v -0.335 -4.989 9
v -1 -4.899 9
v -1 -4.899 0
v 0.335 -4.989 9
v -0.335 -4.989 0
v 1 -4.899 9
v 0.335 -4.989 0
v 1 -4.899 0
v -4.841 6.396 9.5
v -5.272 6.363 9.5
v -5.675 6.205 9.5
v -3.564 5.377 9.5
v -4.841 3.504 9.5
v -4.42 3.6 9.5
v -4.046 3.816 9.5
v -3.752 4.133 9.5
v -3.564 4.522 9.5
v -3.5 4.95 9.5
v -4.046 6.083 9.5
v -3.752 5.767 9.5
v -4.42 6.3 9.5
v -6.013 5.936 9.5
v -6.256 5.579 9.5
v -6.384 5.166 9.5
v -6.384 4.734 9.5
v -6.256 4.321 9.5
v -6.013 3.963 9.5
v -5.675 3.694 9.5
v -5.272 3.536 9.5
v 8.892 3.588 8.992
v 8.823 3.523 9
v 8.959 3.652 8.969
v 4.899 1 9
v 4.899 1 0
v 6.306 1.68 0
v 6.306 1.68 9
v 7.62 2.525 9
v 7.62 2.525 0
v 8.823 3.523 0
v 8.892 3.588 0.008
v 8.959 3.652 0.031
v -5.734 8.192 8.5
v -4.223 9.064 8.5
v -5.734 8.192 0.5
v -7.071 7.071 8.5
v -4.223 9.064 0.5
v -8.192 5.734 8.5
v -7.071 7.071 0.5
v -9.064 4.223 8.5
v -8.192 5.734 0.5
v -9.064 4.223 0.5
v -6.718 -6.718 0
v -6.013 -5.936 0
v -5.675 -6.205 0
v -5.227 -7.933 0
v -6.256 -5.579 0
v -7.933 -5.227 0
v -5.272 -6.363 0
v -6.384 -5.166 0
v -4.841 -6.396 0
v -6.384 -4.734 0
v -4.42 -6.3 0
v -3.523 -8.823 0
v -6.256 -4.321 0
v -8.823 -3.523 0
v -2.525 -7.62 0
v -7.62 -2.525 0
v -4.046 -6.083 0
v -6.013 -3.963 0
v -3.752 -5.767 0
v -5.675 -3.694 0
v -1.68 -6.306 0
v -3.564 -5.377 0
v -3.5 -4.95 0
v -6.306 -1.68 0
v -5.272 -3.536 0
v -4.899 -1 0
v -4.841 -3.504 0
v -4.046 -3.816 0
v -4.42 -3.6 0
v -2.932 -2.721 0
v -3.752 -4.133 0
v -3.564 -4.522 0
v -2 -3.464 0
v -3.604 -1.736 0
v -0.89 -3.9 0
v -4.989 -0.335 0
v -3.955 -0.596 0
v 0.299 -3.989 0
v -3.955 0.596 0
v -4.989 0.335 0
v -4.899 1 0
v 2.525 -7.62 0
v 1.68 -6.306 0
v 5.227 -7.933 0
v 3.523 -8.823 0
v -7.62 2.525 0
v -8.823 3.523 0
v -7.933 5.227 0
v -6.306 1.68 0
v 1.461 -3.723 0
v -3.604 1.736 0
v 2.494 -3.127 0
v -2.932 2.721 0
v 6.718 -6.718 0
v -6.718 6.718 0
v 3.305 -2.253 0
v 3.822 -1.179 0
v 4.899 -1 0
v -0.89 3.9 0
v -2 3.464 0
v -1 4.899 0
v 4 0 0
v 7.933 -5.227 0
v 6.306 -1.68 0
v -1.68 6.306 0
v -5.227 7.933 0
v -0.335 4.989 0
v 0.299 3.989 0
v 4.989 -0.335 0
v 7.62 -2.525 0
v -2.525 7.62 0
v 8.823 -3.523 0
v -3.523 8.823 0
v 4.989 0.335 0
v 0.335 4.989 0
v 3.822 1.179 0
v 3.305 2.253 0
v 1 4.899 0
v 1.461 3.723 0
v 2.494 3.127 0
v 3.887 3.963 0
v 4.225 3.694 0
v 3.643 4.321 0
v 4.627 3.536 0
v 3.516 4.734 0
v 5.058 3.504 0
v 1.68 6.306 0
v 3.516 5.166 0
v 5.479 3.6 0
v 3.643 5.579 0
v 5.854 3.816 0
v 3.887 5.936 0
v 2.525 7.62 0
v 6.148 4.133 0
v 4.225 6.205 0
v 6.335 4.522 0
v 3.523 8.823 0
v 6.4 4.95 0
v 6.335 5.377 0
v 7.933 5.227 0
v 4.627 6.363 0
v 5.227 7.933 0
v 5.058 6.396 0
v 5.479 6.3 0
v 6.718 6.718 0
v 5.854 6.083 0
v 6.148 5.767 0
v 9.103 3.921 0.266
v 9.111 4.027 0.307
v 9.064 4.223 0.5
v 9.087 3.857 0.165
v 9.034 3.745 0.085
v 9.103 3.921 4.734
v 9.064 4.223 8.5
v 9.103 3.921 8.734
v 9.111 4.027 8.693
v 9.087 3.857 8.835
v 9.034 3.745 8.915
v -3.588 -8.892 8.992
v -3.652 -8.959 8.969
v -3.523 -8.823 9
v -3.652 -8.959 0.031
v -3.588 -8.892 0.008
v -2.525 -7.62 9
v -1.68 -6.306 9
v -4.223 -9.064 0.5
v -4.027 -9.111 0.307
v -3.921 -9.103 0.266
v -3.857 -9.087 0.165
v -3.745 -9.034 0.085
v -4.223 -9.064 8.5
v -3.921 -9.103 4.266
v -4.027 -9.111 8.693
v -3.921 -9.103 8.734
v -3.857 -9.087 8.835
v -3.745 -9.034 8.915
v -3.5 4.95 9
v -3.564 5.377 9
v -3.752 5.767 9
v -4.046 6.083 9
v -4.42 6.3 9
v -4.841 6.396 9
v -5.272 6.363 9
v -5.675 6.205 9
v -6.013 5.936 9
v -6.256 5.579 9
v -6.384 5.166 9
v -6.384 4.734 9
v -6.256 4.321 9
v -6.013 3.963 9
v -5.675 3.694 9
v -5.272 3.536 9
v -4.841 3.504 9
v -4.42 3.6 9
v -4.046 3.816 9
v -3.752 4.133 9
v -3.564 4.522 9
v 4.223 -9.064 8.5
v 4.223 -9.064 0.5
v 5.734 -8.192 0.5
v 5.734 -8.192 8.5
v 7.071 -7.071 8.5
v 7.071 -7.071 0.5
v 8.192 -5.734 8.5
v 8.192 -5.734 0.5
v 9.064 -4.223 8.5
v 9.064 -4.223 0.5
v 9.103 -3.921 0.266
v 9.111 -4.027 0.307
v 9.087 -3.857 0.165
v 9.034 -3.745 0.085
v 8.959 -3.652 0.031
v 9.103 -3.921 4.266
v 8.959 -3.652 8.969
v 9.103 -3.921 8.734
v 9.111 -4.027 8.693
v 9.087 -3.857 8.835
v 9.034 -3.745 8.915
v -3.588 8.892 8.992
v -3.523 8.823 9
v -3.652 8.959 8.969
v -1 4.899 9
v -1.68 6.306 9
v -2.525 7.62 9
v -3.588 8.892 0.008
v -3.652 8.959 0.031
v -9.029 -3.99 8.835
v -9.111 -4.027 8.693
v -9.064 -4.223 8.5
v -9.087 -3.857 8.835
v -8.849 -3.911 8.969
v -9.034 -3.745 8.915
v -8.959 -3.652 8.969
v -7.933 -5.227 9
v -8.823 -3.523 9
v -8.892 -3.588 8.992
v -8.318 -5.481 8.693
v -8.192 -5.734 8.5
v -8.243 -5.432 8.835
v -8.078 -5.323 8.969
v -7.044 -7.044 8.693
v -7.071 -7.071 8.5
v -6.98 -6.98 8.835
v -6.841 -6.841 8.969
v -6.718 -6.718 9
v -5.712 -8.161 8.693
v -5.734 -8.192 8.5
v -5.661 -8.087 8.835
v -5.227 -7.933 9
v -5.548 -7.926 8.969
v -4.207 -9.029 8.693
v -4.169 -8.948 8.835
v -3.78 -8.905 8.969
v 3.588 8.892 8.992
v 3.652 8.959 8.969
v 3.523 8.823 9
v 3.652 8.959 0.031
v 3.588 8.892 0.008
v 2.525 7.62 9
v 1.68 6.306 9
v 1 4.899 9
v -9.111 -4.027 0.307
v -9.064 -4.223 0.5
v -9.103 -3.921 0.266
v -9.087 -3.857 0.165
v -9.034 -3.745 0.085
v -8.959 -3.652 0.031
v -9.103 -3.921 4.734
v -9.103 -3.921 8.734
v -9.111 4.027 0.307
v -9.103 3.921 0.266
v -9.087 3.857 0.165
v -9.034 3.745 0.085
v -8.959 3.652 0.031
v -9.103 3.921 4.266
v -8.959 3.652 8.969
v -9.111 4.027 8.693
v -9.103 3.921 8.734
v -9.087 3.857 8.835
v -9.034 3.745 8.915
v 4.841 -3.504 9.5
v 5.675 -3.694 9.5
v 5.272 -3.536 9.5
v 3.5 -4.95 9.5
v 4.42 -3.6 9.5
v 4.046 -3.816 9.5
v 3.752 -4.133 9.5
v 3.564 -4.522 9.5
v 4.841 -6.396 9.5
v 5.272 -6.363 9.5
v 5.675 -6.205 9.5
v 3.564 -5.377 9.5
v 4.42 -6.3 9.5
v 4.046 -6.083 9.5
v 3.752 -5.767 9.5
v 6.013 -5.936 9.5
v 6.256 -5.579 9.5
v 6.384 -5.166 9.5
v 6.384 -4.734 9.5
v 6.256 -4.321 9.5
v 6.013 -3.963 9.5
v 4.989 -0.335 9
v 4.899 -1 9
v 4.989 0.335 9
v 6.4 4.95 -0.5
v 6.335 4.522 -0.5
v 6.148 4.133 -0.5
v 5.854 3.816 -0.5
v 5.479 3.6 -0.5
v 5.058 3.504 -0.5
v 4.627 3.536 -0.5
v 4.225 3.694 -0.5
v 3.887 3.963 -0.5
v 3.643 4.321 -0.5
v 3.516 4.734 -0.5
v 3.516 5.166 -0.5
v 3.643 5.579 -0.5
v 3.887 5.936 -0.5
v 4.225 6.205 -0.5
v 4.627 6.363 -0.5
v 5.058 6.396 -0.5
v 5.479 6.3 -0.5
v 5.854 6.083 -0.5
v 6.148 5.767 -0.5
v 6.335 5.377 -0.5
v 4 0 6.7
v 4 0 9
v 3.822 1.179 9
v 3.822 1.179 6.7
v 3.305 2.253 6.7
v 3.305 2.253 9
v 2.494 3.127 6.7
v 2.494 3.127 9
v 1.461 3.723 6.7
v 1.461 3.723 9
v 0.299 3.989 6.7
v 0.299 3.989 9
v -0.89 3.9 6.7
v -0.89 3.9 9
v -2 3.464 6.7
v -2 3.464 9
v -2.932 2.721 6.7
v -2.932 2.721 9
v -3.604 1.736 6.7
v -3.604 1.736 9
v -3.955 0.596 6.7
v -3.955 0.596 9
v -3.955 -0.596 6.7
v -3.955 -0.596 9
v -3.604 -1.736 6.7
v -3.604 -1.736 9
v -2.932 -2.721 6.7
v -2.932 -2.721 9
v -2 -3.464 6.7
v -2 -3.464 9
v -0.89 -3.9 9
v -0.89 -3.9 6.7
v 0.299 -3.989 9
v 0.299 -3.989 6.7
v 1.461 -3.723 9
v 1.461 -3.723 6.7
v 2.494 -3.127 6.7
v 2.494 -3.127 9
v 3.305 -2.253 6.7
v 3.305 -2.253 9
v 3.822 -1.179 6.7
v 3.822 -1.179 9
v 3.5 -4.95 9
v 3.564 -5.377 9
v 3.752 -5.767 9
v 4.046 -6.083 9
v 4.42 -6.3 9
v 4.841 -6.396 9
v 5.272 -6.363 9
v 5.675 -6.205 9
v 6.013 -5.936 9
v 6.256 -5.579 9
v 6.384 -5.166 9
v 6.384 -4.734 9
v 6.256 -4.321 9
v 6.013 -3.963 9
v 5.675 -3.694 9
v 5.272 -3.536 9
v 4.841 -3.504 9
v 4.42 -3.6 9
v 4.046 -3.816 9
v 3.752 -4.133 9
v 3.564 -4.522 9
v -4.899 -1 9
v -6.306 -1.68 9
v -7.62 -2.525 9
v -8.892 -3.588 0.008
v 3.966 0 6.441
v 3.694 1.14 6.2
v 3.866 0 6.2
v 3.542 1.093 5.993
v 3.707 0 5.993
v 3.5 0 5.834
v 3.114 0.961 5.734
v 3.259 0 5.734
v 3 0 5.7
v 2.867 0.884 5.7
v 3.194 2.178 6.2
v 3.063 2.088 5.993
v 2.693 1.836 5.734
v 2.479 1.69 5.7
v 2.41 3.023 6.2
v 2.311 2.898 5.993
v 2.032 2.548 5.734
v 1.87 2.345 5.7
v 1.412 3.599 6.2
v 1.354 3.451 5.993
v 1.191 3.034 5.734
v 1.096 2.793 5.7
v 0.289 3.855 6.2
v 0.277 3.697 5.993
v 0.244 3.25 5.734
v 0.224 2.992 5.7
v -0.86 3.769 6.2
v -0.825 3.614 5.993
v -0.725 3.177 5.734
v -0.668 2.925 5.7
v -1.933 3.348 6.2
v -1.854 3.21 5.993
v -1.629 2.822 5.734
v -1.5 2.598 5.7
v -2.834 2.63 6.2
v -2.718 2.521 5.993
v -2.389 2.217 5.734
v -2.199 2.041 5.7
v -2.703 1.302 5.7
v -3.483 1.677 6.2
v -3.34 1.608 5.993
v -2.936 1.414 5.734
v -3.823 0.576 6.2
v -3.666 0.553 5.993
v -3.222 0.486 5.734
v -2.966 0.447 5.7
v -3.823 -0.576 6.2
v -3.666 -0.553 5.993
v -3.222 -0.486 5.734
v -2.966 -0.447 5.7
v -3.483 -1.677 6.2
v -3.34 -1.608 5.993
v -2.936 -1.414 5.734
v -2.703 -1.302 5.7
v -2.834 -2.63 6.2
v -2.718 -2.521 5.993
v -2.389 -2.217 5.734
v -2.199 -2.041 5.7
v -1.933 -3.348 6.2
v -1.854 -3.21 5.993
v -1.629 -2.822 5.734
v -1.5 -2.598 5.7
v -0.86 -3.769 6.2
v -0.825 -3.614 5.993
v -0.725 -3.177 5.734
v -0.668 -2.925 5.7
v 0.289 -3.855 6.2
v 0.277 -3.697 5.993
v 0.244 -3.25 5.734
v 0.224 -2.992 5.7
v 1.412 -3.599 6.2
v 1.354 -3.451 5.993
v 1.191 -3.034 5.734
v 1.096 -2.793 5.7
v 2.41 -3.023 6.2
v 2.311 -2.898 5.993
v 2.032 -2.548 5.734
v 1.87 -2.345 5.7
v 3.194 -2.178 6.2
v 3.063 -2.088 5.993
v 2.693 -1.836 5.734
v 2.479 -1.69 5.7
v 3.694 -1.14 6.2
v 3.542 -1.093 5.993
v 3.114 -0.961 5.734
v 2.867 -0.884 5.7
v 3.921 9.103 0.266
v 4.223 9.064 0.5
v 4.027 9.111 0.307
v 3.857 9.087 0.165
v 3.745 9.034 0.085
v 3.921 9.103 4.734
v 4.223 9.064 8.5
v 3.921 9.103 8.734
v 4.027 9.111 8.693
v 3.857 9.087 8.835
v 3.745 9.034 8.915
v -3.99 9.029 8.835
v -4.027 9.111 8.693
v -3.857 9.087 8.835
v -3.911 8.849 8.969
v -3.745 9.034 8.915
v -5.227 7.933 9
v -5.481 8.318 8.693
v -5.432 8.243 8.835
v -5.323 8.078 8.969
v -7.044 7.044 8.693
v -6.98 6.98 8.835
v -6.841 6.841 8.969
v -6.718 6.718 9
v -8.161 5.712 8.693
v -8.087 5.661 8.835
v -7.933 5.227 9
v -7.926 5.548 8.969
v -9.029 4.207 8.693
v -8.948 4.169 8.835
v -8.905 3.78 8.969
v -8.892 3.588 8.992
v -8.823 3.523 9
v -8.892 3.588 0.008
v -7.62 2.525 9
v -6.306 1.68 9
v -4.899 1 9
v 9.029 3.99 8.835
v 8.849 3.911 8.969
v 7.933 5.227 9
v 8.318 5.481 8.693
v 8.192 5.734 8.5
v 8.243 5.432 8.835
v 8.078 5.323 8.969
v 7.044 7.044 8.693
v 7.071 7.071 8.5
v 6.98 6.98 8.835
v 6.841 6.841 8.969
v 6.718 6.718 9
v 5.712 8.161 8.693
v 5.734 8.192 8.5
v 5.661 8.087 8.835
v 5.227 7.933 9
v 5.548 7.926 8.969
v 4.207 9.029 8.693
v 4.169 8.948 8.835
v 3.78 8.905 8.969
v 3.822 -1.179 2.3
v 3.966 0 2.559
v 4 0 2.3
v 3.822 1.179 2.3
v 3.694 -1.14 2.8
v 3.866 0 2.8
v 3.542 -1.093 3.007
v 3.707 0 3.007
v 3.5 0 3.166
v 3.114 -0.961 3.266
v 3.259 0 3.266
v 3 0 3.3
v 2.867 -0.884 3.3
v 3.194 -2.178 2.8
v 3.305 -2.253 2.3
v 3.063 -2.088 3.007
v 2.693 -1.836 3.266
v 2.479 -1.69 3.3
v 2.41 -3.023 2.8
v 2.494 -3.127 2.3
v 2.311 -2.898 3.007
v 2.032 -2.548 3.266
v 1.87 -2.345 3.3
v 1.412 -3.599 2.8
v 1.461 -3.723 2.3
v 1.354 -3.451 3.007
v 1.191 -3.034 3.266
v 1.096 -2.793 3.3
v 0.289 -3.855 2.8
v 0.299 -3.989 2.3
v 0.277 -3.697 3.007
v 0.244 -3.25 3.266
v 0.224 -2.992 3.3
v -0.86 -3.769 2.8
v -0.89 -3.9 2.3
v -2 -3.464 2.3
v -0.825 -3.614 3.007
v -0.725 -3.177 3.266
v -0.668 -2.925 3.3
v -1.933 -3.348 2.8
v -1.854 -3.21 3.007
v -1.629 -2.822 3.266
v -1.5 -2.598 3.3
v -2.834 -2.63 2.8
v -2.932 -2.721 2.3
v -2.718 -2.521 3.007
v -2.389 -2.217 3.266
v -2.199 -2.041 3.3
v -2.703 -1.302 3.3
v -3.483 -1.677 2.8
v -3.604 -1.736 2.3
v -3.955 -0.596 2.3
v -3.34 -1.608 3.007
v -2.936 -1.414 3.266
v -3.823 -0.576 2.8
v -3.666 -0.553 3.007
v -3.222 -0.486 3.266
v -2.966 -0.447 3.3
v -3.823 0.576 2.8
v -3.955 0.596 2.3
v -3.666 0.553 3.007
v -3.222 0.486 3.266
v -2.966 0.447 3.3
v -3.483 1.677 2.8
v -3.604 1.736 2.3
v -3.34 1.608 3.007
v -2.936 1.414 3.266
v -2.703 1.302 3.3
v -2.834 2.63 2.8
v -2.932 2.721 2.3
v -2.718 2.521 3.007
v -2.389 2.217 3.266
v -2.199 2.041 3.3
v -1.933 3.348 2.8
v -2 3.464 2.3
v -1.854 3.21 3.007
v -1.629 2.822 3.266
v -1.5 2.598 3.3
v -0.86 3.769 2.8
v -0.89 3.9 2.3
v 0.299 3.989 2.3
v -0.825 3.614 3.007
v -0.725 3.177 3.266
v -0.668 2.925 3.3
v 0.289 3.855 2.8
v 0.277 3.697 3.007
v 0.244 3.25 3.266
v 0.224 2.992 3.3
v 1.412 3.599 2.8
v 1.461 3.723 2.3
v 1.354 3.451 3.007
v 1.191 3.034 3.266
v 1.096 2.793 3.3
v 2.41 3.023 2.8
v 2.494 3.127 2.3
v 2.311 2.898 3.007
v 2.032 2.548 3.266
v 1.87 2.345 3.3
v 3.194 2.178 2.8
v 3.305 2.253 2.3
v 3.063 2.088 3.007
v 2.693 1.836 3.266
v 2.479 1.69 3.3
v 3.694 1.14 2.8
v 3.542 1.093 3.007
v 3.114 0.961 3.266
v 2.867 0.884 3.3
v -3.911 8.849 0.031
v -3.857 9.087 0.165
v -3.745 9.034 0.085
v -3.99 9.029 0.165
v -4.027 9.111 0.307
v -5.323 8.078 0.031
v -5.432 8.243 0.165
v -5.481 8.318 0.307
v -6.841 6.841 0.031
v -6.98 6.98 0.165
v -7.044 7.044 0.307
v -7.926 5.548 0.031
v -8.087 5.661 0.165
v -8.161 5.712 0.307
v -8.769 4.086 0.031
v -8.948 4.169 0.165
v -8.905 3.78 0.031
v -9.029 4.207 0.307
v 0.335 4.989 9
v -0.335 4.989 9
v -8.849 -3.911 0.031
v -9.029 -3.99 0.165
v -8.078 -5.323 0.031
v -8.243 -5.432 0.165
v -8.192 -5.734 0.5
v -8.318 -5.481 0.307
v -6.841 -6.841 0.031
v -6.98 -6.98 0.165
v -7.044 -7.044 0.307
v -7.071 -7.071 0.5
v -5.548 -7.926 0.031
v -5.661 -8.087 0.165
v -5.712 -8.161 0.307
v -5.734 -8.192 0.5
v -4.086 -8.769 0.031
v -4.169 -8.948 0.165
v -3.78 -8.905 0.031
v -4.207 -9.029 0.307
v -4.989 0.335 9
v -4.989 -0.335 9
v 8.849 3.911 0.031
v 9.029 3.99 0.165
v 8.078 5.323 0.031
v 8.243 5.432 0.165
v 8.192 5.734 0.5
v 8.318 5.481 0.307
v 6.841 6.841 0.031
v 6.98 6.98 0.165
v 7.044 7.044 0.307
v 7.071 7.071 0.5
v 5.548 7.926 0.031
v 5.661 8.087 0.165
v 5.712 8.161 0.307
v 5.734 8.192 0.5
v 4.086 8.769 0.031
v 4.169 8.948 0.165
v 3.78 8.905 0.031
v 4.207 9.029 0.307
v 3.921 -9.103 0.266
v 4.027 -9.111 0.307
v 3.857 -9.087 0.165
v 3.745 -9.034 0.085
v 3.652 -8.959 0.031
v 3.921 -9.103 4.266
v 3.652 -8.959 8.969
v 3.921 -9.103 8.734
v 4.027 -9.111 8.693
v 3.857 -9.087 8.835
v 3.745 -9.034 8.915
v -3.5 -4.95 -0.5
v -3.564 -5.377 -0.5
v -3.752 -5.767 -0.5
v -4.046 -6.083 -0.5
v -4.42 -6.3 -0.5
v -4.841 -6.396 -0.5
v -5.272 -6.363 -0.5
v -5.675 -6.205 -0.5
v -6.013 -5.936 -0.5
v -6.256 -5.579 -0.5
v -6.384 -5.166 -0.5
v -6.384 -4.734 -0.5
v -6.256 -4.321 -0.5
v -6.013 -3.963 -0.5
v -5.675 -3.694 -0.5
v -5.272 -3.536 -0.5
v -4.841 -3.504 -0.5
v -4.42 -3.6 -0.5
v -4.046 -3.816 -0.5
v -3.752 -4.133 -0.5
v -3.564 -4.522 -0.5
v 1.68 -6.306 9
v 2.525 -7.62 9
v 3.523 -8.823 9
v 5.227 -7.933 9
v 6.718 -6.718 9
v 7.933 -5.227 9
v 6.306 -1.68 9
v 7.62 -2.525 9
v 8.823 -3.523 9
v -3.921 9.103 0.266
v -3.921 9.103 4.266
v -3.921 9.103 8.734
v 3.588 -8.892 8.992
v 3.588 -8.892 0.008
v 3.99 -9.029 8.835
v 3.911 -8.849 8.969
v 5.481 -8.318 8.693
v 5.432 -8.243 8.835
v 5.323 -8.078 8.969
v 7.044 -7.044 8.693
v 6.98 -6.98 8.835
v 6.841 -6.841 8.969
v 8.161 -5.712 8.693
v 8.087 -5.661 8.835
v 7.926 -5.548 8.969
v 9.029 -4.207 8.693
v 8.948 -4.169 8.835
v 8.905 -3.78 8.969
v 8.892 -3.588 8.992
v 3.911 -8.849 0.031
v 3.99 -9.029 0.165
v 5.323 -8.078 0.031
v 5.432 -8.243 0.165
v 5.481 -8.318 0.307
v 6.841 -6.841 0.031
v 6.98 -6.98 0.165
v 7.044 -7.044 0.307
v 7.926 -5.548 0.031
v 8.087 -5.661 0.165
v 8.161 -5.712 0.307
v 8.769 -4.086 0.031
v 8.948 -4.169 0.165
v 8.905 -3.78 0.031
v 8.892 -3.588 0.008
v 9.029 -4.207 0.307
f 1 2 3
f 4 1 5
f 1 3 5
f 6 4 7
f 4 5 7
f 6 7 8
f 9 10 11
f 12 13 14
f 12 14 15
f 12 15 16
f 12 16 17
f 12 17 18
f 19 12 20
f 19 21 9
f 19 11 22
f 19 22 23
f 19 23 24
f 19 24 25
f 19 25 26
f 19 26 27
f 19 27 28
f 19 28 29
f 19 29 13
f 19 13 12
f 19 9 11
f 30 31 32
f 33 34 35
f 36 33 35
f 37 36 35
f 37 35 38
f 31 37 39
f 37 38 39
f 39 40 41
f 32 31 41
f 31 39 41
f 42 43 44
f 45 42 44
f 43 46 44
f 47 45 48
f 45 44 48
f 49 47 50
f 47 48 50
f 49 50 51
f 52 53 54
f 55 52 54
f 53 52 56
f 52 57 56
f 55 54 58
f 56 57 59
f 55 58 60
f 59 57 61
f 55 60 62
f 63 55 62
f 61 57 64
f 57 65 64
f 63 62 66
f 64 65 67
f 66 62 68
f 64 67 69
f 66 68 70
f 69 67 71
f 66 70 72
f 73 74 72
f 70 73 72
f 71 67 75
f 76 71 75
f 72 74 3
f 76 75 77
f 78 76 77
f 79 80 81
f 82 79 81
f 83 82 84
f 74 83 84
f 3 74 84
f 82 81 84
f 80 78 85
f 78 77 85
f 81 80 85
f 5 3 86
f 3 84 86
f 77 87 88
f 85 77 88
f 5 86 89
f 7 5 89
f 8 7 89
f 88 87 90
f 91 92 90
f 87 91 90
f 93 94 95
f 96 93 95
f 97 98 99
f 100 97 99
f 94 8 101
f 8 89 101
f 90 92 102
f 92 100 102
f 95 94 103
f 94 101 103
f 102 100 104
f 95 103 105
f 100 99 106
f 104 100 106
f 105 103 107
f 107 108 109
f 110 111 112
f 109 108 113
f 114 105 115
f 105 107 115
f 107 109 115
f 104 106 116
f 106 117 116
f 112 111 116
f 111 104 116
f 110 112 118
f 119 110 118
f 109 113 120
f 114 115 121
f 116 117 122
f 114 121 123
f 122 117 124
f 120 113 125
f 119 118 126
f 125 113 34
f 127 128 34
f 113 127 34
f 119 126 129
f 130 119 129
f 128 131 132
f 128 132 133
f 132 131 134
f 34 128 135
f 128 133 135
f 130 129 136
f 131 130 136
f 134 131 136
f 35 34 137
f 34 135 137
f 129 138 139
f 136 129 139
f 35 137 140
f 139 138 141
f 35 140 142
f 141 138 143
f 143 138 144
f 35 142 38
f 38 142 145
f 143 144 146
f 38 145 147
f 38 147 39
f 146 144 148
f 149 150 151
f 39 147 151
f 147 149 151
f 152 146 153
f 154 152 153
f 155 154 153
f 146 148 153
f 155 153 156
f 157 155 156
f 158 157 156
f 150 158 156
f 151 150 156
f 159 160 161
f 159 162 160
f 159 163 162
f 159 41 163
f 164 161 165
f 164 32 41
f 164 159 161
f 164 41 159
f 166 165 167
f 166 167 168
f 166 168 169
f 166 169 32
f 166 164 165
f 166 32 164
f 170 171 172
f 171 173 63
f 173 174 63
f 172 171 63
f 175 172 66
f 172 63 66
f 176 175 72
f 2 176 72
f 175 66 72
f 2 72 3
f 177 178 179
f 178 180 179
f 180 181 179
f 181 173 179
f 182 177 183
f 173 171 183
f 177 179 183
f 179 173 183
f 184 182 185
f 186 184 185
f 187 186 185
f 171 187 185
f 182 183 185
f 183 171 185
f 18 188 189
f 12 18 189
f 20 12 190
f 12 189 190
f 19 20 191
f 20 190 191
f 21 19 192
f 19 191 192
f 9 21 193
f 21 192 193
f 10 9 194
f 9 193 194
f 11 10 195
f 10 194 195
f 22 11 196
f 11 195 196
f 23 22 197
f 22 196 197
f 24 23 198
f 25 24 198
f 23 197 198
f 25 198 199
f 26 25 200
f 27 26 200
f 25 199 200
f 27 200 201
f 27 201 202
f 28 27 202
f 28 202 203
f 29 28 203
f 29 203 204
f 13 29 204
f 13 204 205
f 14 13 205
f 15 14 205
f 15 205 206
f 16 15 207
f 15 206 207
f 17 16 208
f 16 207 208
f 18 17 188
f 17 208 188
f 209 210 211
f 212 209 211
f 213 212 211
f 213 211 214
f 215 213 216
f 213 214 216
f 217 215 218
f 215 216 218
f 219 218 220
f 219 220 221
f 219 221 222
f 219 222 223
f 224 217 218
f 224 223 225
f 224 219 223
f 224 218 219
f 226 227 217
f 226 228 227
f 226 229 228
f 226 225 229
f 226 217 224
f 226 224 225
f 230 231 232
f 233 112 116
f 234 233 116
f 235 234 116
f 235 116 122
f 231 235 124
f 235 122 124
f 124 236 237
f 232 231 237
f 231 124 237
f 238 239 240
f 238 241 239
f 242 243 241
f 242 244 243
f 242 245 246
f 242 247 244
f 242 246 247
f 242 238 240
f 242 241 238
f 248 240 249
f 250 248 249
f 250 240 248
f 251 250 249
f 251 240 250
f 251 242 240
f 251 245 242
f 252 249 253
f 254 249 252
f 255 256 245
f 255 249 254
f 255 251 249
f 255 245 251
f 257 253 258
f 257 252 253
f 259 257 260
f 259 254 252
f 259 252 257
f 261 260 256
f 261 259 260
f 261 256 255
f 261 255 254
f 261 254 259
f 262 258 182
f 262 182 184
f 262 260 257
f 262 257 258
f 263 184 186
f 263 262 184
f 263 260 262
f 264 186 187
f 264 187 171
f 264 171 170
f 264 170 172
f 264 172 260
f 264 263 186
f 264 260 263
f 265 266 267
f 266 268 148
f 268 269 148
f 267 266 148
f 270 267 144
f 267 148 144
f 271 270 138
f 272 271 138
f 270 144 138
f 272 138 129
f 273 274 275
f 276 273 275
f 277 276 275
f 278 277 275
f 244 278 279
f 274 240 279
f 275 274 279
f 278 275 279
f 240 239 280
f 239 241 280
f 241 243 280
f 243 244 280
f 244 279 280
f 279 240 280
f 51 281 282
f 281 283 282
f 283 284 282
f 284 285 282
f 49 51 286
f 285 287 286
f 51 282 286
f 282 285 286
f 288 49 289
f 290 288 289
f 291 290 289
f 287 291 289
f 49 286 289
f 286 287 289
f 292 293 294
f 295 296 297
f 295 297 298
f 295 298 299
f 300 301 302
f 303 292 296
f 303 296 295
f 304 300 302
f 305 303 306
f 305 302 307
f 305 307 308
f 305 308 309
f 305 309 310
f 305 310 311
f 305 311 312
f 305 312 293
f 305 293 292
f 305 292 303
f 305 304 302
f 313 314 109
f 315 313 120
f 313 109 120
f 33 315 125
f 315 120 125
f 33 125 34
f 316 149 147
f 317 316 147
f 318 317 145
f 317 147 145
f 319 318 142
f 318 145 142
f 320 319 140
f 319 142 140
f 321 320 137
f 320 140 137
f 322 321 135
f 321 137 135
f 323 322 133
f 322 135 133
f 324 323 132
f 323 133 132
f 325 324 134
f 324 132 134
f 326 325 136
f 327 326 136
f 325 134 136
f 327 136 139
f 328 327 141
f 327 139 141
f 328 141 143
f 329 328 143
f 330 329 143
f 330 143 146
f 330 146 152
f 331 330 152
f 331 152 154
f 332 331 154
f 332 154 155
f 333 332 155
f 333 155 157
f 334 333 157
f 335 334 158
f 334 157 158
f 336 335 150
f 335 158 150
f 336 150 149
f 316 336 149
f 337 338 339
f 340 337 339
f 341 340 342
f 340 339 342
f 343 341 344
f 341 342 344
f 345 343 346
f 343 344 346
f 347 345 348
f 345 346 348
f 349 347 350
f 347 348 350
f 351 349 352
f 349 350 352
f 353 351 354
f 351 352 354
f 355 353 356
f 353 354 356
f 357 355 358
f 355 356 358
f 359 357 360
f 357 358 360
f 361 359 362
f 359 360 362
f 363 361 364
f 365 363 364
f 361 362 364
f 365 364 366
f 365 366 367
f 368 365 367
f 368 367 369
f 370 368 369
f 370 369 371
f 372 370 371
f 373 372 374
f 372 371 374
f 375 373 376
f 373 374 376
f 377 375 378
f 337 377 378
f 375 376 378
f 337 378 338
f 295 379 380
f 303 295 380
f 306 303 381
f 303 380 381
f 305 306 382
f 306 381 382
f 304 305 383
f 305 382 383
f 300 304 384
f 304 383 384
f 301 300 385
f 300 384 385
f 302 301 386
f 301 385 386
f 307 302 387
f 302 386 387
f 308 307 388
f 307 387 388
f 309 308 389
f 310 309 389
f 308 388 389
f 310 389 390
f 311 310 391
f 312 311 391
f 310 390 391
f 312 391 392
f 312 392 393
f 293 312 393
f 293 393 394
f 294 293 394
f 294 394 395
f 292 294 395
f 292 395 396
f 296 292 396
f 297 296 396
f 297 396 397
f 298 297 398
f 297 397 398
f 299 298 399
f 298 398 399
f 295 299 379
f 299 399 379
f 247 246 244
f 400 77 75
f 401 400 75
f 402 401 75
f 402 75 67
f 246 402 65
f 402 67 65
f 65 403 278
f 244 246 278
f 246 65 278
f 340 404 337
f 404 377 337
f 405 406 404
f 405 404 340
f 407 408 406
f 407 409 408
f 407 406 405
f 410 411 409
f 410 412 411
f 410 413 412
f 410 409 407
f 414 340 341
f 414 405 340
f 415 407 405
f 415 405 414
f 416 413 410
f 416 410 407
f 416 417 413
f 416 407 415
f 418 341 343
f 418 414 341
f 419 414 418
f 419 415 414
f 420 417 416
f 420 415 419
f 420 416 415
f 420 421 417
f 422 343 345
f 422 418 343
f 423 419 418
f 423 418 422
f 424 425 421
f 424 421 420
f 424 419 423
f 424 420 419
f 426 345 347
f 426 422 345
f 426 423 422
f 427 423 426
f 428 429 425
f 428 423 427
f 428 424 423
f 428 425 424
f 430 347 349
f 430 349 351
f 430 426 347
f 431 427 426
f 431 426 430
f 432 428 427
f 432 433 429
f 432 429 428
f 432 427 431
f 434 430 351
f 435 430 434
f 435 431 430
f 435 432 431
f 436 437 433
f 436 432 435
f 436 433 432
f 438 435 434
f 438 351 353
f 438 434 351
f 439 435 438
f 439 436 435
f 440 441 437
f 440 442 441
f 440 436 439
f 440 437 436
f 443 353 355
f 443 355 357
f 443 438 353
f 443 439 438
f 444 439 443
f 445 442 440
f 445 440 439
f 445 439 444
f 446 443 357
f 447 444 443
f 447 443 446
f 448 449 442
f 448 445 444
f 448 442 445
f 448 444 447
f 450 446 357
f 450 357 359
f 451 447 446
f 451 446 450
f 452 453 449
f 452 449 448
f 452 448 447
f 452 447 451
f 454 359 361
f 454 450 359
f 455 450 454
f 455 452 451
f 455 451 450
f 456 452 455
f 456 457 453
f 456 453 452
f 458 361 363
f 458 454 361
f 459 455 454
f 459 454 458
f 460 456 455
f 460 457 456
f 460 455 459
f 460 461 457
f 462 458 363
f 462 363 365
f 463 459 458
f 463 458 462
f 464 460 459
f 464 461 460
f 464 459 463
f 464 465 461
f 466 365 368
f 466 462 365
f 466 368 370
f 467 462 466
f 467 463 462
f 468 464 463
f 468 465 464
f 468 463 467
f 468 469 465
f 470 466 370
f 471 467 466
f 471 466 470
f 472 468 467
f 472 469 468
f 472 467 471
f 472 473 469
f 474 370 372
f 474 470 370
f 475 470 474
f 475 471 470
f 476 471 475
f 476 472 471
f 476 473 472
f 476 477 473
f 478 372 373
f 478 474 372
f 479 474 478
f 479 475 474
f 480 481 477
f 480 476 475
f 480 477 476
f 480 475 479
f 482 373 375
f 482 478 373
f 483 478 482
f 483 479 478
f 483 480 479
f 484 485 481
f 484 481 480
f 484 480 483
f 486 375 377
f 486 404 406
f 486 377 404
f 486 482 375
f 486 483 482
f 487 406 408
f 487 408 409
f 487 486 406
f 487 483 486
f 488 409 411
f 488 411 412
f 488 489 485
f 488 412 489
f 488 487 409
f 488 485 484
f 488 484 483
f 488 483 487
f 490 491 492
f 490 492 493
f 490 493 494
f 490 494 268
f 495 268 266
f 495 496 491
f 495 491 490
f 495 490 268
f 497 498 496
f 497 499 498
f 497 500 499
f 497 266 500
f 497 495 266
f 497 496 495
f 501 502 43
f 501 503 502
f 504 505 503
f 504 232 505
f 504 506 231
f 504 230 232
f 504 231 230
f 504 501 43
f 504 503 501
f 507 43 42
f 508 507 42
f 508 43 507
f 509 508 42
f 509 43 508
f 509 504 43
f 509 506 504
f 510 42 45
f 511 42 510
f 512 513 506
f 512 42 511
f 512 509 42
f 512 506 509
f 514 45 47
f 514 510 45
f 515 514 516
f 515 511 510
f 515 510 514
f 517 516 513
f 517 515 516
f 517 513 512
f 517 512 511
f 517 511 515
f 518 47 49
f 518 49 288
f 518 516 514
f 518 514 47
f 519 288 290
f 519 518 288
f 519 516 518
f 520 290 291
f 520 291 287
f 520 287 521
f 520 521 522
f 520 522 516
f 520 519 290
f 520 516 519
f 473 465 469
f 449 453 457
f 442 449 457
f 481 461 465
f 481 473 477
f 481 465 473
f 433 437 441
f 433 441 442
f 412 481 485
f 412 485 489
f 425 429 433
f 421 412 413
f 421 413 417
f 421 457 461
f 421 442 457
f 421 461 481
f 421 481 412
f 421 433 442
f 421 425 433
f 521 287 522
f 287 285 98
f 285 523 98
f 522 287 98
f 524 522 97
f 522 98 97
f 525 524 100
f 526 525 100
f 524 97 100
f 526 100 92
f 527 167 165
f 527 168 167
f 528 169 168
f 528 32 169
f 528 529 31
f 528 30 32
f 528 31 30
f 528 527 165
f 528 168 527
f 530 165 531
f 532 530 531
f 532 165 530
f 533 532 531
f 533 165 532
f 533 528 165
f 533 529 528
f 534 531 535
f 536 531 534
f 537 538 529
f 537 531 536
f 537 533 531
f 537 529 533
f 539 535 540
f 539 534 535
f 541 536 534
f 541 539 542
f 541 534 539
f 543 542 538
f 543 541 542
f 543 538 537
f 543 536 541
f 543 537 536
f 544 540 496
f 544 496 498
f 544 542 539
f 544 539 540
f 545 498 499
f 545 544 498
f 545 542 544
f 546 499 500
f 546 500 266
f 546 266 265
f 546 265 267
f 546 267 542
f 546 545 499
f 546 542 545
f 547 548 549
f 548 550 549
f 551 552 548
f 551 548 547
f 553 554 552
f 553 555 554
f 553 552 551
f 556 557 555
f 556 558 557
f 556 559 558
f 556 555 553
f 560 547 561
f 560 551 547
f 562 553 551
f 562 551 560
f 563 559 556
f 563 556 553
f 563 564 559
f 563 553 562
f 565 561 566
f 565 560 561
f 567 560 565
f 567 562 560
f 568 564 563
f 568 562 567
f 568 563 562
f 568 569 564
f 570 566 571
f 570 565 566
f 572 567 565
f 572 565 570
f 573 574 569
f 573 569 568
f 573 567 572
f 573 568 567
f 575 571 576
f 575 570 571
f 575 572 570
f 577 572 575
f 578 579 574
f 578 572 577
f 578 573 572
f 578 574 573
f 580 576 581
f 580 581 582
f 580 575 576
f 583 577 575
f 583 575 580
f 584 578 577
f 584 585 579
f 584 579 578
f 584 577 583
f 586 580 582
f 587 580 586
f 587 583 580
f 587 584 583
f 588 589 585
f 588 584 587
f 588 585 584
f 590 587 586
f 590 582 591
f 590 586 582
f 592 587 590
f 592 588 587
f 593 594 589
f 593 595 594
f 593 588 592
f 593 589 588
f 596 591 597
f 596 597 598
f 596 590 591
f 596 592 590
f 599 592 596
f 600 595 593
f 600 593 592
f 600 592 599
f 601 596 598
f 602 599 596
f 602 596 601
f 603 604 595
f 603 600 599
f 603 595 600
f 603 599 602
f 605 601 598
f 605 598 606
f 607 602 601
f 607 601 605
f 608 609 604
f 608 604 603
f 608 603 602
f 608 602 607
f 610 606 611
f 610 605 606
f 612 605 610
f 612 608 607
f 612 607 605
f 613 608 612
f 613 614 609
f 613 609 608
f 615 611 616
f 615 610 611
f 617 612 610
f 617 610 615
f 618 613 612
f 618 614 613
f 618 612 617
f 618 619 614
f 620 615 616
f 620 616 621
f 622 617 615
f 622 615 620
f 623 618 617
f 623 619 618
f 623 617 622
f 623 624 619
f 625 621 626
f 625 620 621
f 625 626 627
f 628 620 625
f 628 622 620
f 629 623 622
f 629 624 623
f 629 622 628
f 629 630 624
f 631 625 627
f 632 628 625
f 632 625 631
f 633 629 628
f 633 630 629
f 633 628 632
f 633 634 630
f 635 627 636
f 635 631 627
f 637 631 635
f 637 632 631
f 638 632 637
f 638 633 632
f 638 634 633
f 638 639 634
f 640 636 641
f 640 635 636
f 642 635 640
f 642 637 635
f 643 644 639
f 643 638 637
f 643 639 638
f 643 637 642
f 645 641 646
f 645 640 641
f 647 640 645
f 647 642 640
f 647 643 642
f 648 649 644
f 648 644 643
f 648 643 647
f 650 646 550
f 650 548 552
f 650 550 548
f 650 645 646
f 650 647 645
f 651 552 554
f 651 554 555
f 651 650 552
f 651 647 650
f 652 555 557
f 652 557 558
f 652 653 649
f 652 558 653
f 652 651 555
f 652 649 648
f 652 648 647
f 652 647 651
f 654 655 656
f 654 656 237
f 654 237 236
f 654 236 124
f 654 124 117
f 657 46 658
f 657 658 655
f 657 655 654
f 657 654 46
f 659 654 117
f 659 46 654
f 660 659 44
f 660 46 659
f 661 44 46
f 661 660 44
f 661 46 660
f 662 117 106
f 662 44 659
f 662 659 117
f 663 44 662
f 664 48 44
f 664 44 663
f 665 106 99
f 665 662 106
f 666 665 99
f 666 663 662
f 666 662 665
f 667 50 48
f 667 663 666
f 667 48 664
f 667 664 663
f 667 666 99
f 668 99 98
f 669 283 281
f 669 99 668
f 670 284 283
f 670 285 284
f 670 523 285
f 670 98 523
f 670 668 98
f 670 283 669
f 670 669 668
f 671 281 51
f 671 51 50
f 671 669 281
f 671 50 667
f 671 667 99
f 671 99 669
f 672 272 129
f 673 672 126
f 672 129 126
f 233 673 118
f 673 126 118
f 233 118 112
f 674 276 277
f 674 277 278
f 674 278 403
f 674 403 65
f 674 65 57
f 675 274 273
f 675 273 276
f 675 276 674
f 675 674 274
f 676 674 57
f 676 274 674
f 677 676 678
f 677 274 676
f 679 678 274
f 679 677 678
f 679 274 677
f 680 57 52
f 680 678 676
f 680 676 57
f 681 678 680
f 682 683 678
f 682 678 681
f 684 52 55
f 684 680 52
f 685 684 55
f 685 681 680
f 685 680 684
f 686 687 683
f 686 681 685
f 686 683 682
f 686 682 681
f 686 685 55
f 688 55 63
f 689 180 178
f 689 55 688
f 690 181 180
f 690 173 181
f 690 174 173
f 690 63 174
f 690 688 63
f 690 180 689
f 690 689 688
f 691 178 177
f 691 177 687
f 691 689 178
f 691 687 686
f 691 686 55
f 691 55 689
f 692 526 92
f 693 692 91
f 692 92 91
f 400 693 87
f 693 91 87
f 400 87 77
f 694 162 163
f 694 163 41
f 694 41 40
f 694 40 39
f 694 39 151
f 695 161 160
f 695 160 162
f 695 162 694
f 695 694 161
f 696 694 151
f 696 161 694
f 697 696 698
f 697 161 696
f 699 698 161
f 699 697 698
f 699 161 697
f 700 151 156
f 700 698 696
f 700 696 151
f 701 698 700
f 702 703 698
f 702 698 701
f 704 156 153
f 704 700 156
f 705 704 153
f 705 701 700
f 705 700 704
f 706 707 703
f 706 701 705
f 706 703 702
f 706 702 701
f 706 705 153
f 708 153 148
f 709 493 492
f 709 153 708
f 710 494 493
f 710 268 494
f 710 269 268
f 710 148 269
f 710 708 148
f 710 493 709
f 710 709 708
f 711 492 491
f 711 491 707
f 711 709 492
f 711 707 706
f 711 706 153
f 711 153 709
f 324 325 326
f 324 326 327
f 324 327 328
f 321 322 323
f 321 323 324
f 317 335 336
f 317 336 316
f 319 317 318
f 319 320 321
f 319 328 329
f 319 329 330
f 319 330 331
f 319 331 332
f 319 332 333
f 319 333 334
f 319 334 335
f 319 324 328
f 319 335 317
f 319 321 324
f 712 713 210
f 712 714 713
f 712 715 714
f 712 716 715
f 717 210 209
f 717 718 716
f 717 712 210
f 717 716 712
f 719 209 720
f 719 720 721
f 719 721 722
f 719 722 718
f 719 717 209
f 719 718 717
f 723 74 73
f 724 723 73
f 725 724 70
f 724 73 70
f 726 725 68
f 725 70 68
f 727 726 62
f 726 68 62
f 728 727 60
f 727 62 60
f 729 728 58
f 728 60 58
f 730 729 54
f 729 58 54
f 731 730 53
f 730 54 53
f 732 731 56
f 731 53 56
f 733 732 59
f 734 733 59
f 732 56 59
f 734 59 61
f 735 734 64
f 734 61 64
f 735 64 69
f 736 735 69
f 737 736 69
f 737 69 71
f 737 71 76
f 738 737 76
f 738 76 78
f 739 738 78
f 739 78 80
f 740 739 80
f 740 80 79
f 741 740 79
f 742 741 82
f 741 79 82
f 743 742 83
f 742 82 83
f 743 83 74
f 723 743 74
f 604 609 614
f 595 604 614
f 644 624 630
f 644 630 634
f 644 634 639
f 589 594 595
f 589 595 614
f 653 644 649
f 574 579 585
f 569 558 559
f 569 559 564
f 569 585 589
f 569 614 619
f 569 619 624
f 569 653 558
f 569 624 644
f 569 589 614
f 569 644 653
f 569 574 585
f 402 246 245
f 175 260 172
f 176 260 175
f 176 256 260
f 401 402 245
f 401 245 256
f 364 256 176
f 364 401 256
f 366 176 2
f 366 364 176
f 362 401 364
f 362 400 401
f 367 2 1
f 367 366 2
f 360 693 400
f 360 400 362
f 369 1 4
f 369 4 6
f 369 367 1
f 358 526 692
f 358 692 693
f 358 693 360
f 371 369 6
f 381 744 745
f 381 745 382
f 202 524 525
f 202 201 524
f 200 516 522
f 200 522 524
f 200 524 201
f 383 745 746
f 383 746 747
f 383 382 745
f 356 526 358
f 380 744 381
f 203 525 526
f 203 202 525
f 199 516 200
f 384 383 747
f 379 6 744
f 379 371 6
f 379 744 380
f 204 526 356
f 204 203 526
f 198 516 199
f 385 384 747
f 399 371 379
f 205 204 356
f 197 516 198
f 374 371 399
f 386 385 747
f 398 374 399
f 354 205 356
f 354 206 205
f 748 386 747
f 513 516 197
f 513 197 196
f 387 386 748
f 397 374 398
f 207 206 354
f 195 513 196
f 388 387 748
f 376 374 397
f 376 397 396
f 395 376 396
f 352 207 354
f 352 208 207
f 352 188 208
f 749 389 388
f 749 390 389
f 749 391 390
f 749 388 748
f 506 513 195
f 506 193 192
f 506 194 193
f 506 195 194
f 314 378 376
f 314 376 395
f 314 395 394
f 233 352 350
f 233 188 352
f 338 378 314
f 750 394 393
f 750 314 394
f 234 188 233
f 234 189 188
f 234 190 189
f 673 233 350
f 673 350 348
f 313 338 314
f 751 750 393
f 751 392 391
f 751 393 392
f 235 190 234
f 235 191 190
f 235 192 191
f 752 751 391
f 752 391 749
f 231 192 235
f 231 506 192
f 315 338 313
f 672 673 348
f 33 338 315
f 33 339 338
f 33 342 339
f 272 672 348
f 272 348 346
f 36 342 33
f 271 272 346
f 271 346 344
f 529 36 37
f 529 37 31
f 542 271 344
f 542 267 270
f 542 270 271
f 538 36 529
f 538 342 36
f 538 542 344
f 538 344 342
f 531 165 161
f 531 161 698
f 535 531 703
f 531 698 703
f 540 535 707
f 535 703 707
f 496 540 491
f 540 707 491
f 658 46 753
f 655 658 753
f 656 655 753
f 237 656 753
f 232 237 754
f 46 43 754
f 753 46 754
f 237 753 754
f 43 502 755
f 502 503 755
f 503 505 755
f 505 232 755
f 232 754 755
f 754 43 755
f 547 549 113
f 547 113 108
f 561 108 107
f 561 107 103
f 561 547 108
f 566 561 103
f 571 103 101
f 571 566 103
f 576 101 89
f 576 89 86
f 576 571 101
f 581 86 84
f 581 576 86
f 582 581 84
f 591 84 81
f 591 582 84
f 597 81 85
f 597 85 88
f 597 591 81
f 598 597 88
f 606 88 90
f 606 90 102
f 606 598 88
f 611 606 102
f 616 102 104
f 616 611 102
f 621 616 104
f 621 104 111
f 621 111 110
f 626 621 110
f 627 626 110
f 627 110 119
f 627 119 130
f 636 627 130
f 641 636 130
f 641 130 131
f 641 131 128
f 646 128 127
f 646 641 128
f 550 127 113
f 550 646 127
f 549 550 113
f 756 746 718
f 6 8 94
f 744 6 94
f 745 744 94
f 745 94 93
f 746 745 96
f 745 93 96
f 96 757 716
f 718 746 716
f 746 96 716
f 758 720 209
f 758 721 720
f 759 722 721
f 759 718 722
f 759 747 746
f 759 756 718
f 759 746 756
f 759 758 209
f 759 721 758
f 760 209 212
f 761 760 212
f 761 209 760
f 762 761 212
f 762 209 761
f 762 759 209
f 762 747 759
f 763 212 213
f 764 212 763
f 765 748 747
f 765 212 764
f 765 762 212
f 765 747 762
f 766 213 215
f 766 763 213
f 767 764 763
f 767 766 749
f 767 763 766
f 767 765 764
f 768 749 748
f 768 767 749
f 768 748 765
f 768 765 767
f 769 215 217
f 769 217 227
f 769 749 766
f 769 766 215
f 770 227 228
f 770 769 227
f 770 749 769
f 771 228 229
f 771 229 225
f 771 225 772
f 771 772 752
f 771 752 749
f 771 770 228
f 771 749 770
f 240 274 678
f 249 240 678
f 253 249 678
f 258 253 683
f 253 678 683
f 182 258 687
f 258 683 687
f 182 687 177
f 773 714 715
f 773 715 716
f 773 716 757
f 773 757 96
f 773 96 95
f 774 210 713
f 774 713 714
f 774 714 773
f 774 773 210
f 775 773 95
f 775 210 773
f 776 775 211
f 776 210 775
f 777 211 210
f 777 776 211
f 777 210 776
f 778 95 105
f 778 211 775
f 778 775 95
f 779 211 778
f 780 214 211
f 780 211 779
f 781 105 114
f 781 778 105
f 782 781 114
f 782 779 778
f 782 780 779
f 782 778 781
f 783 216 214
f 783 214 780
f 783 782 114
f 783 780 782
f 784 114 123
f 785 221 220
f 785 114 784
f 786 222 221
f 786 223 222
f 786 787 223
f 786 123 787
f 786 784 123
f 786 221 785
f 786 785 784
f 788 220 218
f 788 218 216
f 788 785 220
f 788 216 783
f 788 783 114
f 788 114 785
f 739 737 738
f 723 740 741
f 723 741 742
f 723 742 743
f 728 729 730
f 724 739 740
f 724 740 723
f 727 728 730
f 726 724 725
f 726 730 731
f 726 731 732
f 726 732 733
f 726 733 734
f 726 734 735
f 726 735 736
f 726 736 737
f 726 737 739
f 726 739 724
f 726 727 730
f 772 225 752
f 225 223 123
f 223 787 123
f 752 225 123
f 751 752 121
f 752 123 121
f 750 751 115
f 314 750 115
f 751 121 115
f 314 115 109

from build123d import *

# Parameters (mm, degrees)
EXTRUDE_1_DEPTH     = 9
SKETCH_2_R          = 1.45
EXTRUDE_2_DEPTH     = 0.5
SKETCH_3_R          = 1.45
EXTRUDE_3_DEPTH     = 0.5
SKETCH_4_R          = 4
CUT_EXTRUDE_1_DEPTH = 3.3
CUT_EXTRUDE_START   = -3.3
SKETCH_5_R          = 4
CUT_EXTRUDE_2_DEPTH = 3.3
FILLET_1_R          = 1
FILLET_2_R          = 0.5


with BuildPart() as part:
    # ｽｹｯﾁ1 → ﾎﾞｽ - 押し出し1 (new body)
    with BuildSketch(Plane.XY):
        with BuildLine():
            ThreePointArc((-1, -4.898979486), (0, -5), (1, -4.898979486))
            ThreePointArc((1, -4.898979486), (2.230832692, -7.201060023), (3.9, -9.208148565))
            ThreePointArc((3.9, -9.208148565), (7.071067812, -7.071067812), (9.208148565, -3.9))
            ThreePointArc((9.208148565, -3.9), (7.201060023, -2.230832692), (4.898979486, -1))
            ThreePointArc((4.898979486, -1), (5, 0), (4.898979486, 1))
            ThreePointArc((4.898979486, 1), (7.201060023, 2.230832692), (9.208148565, 3.9))
            ThreePointArc((9.208148565, 3.9), (7.071067812, 7.071067812), (3.9, 9.208148565))
            ThreePointArc((3.9, 9.208148565), (2.230832692, 7.201060023), (1, 4.898979486))
            ThreePointArc((1, 4.898979486), (0, 5), (-1, 4.898979486))
            ThreePointArc((-1, 4.898979486), (-2.230832692, 7.201060023), (-3.9, 9.208148565))
            ThreePointArc((-3.9, 9.208148565), (-7.071067812, 7.071067812), (-9.208148565, 3.9))
            ThreePointArc((-9.208148565, 3.9), (-7.201060023, 2.230832692), (-4.898979486, 1))
            ThreePointArc((-4.898979486, 1), (-5, 0), (-4.898979486, -1))
            ThreePointArc((-4.898979486, -1), (-7.201060023, -2.230832692), (-9.208148565, -3.9))
            ThreePointArc((-9.208148565, -3.9), (-7.071067812, -7.071067812), (-3.9, -9.208148565))
            ThreePointArc((-3.9, -9.208148565), (-2.230832692, -7.201060023), (-1, -4.898979486))
        make_face()
    extrude(amount=EXTRUDE_1_DEPTH)

    # ｽｹｯﾁ2 → ﾎﾞｽ - 押し出し2 (add)
    with BuildSketch(Plane.XY.offset(9)):
        with Locations((-4.949747468, 4.949747468)):
            Circle(SKETCH_2_R)
        with Locations(Location((4.949747468, -4.949747468, 0), (0, 0, 180))):
            Circle(SKETCH_2_R)
    extrude(amount=EXTRUDE_2_DEPTH)

    # ｽｹｯﾁ3 → ﾎﾞｽ - 押し出し3 (add)
    with BuildSketch(Plane(origin=(0, 0, 0), x_dir=(-1, 0, 0), z_dir=(0, 0, -1))):
        with Locations(Location((-4.949747468, 4.949747468, 0), (0, 0, 180))):
            Circle(SKETCH_3_R)
        with Locations(Location((4.949747468, -4.949747468, 0), (0, 0, 180))):
            Circle(SKETCH_3_R)
    extrude(amount=EXTRUDE_3_DEPTH)

    # ｽｹｯﾁ4 → ｶｯﾄ - 押し出し1 (cut)
    with BuildSketch(Plane.XY.offset(9)):
        Circle(SKETCH_4_R)
    extrude(amount=-CUT_EXTRUDE_1_DEPTH, mode=Mode.SUBTRACT)

    # ｽｹｯﾁ5 → ｶｯﾄ - 押し出し2 (cut)
    with BuildSketch(Plane(origin=(0, 0, 0), x_dir=(-1, 0, 0), z_dir=(0, 0, -1)).offset(CUT_EXTRUDE_START)):
        with Locations(Location((0, 0, 0), (0, 0, 180))):
            Circle(SKETCH_5_R)
    extrude(amount=CUT_EXTRUDE_2_DEPTH, mode=Mode.SUBTRACT)

    # ﾌｨﾚｯﾄ1
    fillet_1_edges = [part.edges().sort_by_distance(p)[0] for p in [
        (-4, 0, 5.7),
        (-4, 0, 3.3),
    ]]
    fillet(fillet_1_edges, radius=FILLET_1_R)

    # ﾌｨﾚｯﾄ2
    fillet_2_edges = [part.edges().sort_by_distance(p)[0] for p in [
        (7.071067812, -7.071067812, 0),
        (-7.071067812, 7.071067812, 9),
        (-7.071067812, -7.071067812, 0),
        (-7.071067812, 7.071067812, 0),
        (7.071067812, 7.071067812, 0),
        (9.208148565, 3.9, 4.5),
        (9.208148565, -3.9, 4.5),
        (3.9, -9.208148565, 4.5),
        (-3.9, -9.208148565, 4.5),
        (-9.208148565, -3.9, 4.5),
        (-9.208148565, 3.9, 4.5),
        (-3.9, 9.208148565, 4.5),
        (3.9, 9.208148565, 4.5),
        (-7.071067812, -7.071067812, 9),
        (7.071067812, 7.071067812, 9),
        (7.071067812, -7.071067812, 9),
    ]]
    fillet(fillet_2_edges, radius=FILLET_2_R)


solid = part.part
